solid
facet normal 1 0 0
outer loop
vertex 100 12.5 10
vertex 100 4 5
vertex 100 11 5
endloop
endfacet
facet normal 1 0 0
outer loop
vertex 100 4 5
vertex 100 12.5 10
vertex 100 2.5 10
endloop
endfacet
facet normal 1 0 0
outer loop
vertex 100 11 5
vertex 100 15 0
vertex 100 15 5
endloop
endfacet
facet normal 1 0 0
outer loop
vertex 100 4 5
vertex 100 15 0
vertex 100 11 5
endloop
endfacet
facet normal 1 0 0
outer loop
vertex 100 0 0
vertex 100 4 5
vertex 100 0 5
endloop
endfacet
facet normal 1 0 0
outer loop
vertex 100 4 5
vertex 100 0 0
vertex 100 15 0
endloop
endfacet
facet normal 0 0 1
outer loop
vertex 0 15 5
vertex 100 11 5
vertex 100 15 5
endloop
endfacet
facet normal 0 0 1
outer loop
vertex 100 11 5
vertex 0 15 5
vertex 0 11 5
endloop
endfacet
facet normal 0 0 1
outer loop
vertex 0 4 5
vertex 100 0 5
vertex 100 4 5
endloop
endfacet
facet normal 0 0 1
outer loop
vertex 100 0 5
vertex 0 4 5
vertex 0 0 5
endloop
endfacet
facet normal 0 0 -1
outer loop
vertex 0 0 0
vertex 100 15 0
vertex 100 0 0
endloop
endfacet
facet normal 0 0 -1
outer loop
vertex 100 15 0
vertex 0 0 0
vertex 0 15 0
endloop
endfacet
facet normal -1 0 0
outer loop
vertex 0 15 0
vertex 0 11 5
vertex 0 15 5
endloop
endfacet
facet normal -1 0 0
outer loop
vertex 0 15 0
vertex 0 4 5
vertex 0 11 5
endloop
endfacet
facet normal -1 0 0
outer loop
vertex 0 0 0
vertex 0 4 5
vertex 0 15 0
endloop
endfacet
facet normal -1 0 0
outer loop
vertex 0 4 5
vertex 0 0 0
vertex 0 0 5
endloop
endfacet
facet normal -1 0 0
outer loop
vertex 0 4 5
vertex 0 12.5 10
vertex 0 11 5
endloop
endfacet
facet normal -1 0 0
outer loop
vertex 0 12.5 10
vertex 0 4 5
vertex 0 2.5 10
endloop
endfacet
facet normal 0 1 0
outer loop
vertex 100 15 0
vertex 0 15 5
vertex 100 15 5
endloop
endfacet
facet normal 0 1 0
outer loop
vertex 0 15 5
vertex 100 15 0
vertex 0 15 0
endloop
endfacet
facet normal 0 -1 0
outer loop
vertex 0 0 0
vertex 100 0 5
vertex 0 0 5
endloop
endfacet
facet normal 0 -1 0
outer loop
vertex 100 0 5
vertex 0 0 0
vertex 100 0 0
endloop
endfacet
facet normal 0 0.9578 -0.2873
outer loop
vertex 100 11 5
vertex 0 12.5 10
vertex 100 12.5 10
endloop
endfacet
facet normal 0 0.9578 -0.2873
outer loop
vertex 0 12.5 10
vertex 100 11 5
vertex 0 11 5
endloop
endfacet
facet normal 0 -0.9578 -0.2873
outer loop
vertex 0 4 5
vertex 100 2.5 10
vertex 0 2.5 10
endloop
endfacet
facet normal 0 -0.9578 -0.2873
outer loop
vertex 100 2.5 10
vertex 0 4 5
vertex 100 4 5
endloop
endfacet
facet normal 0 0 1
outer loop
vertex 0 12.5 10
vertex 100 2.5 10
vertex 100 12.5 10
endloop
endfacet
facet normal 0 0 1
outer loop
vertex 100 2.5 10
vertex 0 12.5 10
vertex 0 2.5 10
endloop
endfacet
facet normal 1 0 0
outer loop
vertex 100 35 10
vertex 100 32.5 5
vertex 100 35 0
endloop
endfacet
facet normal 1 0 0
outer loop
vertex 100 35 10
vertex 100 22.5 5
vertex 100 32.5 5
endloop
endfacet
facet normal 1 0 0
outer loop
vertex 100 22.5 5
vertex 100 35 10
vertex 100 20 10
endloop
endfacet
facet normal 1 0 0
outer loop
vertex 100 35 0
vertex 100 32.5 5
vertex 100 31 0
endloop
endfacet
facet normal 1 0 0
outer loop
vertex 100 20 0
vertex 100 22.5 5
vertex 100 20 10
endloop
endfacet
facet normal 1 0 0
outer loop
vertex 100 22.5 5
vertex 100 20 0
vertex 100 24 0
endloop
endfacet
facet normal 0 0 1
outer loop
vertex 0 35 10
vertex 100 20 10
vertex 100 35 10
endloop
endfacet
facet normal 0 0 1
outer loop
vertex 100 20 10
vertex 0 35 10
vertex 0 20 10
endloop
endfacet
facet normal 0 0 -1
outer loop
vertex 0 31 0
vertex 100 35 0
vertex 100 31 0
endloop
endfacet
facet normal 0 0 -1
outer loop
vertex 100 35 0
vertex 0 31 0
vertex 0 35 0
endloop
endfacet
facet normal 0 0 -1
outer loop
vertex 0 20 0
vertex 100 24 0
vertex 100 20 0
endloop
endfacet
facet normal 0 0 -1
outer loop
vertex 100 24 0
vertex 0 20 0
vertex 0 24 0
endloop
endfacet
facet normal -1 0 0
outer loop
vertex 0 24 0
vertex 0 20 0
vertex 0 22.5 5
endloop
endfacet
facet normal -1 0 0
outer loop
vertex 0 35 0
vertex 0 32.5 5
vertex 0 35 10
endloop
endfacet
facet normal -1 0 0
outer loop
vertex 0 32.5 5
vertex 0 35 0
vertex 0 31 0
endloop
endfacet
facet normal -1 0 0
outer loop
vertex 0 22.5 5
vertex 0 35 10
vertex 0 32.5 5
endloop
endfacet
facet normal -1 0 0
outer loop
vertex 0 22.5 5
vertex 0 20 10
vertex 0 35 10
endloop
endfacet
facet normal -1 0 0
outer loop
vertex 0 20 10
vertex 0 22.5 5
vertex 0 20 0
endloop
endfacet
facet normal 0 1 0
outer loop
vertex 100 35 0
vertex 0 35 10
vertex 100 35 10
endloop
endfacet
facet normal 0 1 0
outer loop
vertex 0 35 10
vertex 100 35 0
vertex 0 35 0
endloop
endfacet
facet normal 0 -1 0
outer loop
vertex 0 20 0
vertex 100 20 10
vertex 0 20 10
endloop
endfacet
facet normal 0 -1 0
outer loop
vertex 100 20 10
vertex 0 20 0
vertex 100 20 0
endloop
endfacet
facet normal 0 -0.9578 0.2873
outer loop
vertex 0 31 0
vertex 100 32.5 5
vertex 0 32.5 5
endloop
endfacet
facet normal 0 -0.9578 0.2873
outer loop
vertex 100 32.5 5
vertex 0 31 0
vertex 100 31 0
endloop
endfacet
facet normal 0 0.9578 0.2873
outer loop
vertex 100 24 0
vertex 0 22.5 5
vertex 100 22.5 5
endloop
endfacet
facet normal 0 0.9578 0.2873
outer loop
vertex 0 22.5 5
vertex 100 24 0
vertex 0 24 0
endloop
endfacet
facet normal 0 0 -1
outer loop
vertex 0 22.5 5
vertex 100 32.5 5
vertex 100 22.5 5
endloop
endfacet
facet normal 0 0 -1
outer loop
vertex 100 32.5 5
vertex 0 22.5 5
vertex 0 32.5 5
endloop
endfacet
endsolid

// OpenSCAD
/*
Copyright 2018 Michael Gläser

Licensed under the Apache License, Version 2.0 (the "License");
you may not use this file except in compliance with the License.
You may obtain a copy of the License at

    http://www.apache.org/licenses/LICENSE-2.0

Unless required by applicable law or agreed to in writing, software
distributed under the License is distributed on an "AS IS" BASIS,
WITHOUT WARRANTIES OR CONDITIONS OF ANY KIND, either express or implied.
See the License for the specific language governing permissions and
limitations under the License.
*/

module beam_V_Female(
    beamLength=100, beamWidth=15, beamHeight=10,
    upperFlangeWidth=10, lowerFlangeWidth=7, flangeHeight=5
) {
    difference() {
    // base
    cube([beamLength, beamWidth, beamHeight]);
    // flange
    translate([0, beamWidth/2, 0]) {
        polyhedron(
            points=[
                [0,lowerFlangeWidth/2,0], [0,-lowerFlangeWidth/2,0], [0,-upperFlangeWidth/2,flangeHeight], [0,upperFlangeWidth/2,flangeHeight],
                [beamLength,lowerFlangeWidth/2,0], [beamLength,-lowerFlangeWidth/2,0], [beamLength,-upperFlangeWidth/2,flangeHeight], [beamLength,upperFlangeWidth/2,flangeHeight]
            ],
            faces=[[0,1,2,3],[0,3,7,4],[1,5,6,2],[3,2,6,7],[0,4,5,1],[7,6,5,4]]
        );
    };
};
};

module beam_V_Male(
    beamLength=100, beamWidth=15, beamHeight=10,
    upperFlangeWidth=10, lowerFlangeWidth=0, flangeHeight=5
) {
    
    lowerFlangeWidth= lowerFlangeWidth==0 ? upperFlangeWidth*.8 : lowerFlangeWidth;
    
    // base
    cube([beamLength, beamWidth, beamHeight-flangeHeight]);
    // flange
    translate([0, beamWidth/2, beamHeight-flangeHeight]) {
        polyhedron(
            points=[
                [0,lowerFlangeWidth/2,0], [0,-lowerFlangeWidth/2,0], [0,-upperFlangeWidth/2,flangeHeight], [0,upperFlangeWidth/2,flangeHeight],
                [beamLength,lowerFlangeWidth/2,0], [beamLength,-lowerFlangeWidth/2,0], [beamLength,-upperFlangeWidth/2,flangeHeight], [beamLength,upperFlangeWidth/2,flangeHeight]
            ],
            faces=[[0,1,2,3],[0,3,7,4],[1,5,6,2],[3,2,6,7],[0,4,5,1],[7,6,5,4]]
        );
    };
};

module showroom() {
    translate([0, 0, 0]) {
        beam_V_Male(lowerFlangeWidth=7);
    };
    translate([0, 20, 0]) {
        beam_V_Female();
    };  
};

showroom();
